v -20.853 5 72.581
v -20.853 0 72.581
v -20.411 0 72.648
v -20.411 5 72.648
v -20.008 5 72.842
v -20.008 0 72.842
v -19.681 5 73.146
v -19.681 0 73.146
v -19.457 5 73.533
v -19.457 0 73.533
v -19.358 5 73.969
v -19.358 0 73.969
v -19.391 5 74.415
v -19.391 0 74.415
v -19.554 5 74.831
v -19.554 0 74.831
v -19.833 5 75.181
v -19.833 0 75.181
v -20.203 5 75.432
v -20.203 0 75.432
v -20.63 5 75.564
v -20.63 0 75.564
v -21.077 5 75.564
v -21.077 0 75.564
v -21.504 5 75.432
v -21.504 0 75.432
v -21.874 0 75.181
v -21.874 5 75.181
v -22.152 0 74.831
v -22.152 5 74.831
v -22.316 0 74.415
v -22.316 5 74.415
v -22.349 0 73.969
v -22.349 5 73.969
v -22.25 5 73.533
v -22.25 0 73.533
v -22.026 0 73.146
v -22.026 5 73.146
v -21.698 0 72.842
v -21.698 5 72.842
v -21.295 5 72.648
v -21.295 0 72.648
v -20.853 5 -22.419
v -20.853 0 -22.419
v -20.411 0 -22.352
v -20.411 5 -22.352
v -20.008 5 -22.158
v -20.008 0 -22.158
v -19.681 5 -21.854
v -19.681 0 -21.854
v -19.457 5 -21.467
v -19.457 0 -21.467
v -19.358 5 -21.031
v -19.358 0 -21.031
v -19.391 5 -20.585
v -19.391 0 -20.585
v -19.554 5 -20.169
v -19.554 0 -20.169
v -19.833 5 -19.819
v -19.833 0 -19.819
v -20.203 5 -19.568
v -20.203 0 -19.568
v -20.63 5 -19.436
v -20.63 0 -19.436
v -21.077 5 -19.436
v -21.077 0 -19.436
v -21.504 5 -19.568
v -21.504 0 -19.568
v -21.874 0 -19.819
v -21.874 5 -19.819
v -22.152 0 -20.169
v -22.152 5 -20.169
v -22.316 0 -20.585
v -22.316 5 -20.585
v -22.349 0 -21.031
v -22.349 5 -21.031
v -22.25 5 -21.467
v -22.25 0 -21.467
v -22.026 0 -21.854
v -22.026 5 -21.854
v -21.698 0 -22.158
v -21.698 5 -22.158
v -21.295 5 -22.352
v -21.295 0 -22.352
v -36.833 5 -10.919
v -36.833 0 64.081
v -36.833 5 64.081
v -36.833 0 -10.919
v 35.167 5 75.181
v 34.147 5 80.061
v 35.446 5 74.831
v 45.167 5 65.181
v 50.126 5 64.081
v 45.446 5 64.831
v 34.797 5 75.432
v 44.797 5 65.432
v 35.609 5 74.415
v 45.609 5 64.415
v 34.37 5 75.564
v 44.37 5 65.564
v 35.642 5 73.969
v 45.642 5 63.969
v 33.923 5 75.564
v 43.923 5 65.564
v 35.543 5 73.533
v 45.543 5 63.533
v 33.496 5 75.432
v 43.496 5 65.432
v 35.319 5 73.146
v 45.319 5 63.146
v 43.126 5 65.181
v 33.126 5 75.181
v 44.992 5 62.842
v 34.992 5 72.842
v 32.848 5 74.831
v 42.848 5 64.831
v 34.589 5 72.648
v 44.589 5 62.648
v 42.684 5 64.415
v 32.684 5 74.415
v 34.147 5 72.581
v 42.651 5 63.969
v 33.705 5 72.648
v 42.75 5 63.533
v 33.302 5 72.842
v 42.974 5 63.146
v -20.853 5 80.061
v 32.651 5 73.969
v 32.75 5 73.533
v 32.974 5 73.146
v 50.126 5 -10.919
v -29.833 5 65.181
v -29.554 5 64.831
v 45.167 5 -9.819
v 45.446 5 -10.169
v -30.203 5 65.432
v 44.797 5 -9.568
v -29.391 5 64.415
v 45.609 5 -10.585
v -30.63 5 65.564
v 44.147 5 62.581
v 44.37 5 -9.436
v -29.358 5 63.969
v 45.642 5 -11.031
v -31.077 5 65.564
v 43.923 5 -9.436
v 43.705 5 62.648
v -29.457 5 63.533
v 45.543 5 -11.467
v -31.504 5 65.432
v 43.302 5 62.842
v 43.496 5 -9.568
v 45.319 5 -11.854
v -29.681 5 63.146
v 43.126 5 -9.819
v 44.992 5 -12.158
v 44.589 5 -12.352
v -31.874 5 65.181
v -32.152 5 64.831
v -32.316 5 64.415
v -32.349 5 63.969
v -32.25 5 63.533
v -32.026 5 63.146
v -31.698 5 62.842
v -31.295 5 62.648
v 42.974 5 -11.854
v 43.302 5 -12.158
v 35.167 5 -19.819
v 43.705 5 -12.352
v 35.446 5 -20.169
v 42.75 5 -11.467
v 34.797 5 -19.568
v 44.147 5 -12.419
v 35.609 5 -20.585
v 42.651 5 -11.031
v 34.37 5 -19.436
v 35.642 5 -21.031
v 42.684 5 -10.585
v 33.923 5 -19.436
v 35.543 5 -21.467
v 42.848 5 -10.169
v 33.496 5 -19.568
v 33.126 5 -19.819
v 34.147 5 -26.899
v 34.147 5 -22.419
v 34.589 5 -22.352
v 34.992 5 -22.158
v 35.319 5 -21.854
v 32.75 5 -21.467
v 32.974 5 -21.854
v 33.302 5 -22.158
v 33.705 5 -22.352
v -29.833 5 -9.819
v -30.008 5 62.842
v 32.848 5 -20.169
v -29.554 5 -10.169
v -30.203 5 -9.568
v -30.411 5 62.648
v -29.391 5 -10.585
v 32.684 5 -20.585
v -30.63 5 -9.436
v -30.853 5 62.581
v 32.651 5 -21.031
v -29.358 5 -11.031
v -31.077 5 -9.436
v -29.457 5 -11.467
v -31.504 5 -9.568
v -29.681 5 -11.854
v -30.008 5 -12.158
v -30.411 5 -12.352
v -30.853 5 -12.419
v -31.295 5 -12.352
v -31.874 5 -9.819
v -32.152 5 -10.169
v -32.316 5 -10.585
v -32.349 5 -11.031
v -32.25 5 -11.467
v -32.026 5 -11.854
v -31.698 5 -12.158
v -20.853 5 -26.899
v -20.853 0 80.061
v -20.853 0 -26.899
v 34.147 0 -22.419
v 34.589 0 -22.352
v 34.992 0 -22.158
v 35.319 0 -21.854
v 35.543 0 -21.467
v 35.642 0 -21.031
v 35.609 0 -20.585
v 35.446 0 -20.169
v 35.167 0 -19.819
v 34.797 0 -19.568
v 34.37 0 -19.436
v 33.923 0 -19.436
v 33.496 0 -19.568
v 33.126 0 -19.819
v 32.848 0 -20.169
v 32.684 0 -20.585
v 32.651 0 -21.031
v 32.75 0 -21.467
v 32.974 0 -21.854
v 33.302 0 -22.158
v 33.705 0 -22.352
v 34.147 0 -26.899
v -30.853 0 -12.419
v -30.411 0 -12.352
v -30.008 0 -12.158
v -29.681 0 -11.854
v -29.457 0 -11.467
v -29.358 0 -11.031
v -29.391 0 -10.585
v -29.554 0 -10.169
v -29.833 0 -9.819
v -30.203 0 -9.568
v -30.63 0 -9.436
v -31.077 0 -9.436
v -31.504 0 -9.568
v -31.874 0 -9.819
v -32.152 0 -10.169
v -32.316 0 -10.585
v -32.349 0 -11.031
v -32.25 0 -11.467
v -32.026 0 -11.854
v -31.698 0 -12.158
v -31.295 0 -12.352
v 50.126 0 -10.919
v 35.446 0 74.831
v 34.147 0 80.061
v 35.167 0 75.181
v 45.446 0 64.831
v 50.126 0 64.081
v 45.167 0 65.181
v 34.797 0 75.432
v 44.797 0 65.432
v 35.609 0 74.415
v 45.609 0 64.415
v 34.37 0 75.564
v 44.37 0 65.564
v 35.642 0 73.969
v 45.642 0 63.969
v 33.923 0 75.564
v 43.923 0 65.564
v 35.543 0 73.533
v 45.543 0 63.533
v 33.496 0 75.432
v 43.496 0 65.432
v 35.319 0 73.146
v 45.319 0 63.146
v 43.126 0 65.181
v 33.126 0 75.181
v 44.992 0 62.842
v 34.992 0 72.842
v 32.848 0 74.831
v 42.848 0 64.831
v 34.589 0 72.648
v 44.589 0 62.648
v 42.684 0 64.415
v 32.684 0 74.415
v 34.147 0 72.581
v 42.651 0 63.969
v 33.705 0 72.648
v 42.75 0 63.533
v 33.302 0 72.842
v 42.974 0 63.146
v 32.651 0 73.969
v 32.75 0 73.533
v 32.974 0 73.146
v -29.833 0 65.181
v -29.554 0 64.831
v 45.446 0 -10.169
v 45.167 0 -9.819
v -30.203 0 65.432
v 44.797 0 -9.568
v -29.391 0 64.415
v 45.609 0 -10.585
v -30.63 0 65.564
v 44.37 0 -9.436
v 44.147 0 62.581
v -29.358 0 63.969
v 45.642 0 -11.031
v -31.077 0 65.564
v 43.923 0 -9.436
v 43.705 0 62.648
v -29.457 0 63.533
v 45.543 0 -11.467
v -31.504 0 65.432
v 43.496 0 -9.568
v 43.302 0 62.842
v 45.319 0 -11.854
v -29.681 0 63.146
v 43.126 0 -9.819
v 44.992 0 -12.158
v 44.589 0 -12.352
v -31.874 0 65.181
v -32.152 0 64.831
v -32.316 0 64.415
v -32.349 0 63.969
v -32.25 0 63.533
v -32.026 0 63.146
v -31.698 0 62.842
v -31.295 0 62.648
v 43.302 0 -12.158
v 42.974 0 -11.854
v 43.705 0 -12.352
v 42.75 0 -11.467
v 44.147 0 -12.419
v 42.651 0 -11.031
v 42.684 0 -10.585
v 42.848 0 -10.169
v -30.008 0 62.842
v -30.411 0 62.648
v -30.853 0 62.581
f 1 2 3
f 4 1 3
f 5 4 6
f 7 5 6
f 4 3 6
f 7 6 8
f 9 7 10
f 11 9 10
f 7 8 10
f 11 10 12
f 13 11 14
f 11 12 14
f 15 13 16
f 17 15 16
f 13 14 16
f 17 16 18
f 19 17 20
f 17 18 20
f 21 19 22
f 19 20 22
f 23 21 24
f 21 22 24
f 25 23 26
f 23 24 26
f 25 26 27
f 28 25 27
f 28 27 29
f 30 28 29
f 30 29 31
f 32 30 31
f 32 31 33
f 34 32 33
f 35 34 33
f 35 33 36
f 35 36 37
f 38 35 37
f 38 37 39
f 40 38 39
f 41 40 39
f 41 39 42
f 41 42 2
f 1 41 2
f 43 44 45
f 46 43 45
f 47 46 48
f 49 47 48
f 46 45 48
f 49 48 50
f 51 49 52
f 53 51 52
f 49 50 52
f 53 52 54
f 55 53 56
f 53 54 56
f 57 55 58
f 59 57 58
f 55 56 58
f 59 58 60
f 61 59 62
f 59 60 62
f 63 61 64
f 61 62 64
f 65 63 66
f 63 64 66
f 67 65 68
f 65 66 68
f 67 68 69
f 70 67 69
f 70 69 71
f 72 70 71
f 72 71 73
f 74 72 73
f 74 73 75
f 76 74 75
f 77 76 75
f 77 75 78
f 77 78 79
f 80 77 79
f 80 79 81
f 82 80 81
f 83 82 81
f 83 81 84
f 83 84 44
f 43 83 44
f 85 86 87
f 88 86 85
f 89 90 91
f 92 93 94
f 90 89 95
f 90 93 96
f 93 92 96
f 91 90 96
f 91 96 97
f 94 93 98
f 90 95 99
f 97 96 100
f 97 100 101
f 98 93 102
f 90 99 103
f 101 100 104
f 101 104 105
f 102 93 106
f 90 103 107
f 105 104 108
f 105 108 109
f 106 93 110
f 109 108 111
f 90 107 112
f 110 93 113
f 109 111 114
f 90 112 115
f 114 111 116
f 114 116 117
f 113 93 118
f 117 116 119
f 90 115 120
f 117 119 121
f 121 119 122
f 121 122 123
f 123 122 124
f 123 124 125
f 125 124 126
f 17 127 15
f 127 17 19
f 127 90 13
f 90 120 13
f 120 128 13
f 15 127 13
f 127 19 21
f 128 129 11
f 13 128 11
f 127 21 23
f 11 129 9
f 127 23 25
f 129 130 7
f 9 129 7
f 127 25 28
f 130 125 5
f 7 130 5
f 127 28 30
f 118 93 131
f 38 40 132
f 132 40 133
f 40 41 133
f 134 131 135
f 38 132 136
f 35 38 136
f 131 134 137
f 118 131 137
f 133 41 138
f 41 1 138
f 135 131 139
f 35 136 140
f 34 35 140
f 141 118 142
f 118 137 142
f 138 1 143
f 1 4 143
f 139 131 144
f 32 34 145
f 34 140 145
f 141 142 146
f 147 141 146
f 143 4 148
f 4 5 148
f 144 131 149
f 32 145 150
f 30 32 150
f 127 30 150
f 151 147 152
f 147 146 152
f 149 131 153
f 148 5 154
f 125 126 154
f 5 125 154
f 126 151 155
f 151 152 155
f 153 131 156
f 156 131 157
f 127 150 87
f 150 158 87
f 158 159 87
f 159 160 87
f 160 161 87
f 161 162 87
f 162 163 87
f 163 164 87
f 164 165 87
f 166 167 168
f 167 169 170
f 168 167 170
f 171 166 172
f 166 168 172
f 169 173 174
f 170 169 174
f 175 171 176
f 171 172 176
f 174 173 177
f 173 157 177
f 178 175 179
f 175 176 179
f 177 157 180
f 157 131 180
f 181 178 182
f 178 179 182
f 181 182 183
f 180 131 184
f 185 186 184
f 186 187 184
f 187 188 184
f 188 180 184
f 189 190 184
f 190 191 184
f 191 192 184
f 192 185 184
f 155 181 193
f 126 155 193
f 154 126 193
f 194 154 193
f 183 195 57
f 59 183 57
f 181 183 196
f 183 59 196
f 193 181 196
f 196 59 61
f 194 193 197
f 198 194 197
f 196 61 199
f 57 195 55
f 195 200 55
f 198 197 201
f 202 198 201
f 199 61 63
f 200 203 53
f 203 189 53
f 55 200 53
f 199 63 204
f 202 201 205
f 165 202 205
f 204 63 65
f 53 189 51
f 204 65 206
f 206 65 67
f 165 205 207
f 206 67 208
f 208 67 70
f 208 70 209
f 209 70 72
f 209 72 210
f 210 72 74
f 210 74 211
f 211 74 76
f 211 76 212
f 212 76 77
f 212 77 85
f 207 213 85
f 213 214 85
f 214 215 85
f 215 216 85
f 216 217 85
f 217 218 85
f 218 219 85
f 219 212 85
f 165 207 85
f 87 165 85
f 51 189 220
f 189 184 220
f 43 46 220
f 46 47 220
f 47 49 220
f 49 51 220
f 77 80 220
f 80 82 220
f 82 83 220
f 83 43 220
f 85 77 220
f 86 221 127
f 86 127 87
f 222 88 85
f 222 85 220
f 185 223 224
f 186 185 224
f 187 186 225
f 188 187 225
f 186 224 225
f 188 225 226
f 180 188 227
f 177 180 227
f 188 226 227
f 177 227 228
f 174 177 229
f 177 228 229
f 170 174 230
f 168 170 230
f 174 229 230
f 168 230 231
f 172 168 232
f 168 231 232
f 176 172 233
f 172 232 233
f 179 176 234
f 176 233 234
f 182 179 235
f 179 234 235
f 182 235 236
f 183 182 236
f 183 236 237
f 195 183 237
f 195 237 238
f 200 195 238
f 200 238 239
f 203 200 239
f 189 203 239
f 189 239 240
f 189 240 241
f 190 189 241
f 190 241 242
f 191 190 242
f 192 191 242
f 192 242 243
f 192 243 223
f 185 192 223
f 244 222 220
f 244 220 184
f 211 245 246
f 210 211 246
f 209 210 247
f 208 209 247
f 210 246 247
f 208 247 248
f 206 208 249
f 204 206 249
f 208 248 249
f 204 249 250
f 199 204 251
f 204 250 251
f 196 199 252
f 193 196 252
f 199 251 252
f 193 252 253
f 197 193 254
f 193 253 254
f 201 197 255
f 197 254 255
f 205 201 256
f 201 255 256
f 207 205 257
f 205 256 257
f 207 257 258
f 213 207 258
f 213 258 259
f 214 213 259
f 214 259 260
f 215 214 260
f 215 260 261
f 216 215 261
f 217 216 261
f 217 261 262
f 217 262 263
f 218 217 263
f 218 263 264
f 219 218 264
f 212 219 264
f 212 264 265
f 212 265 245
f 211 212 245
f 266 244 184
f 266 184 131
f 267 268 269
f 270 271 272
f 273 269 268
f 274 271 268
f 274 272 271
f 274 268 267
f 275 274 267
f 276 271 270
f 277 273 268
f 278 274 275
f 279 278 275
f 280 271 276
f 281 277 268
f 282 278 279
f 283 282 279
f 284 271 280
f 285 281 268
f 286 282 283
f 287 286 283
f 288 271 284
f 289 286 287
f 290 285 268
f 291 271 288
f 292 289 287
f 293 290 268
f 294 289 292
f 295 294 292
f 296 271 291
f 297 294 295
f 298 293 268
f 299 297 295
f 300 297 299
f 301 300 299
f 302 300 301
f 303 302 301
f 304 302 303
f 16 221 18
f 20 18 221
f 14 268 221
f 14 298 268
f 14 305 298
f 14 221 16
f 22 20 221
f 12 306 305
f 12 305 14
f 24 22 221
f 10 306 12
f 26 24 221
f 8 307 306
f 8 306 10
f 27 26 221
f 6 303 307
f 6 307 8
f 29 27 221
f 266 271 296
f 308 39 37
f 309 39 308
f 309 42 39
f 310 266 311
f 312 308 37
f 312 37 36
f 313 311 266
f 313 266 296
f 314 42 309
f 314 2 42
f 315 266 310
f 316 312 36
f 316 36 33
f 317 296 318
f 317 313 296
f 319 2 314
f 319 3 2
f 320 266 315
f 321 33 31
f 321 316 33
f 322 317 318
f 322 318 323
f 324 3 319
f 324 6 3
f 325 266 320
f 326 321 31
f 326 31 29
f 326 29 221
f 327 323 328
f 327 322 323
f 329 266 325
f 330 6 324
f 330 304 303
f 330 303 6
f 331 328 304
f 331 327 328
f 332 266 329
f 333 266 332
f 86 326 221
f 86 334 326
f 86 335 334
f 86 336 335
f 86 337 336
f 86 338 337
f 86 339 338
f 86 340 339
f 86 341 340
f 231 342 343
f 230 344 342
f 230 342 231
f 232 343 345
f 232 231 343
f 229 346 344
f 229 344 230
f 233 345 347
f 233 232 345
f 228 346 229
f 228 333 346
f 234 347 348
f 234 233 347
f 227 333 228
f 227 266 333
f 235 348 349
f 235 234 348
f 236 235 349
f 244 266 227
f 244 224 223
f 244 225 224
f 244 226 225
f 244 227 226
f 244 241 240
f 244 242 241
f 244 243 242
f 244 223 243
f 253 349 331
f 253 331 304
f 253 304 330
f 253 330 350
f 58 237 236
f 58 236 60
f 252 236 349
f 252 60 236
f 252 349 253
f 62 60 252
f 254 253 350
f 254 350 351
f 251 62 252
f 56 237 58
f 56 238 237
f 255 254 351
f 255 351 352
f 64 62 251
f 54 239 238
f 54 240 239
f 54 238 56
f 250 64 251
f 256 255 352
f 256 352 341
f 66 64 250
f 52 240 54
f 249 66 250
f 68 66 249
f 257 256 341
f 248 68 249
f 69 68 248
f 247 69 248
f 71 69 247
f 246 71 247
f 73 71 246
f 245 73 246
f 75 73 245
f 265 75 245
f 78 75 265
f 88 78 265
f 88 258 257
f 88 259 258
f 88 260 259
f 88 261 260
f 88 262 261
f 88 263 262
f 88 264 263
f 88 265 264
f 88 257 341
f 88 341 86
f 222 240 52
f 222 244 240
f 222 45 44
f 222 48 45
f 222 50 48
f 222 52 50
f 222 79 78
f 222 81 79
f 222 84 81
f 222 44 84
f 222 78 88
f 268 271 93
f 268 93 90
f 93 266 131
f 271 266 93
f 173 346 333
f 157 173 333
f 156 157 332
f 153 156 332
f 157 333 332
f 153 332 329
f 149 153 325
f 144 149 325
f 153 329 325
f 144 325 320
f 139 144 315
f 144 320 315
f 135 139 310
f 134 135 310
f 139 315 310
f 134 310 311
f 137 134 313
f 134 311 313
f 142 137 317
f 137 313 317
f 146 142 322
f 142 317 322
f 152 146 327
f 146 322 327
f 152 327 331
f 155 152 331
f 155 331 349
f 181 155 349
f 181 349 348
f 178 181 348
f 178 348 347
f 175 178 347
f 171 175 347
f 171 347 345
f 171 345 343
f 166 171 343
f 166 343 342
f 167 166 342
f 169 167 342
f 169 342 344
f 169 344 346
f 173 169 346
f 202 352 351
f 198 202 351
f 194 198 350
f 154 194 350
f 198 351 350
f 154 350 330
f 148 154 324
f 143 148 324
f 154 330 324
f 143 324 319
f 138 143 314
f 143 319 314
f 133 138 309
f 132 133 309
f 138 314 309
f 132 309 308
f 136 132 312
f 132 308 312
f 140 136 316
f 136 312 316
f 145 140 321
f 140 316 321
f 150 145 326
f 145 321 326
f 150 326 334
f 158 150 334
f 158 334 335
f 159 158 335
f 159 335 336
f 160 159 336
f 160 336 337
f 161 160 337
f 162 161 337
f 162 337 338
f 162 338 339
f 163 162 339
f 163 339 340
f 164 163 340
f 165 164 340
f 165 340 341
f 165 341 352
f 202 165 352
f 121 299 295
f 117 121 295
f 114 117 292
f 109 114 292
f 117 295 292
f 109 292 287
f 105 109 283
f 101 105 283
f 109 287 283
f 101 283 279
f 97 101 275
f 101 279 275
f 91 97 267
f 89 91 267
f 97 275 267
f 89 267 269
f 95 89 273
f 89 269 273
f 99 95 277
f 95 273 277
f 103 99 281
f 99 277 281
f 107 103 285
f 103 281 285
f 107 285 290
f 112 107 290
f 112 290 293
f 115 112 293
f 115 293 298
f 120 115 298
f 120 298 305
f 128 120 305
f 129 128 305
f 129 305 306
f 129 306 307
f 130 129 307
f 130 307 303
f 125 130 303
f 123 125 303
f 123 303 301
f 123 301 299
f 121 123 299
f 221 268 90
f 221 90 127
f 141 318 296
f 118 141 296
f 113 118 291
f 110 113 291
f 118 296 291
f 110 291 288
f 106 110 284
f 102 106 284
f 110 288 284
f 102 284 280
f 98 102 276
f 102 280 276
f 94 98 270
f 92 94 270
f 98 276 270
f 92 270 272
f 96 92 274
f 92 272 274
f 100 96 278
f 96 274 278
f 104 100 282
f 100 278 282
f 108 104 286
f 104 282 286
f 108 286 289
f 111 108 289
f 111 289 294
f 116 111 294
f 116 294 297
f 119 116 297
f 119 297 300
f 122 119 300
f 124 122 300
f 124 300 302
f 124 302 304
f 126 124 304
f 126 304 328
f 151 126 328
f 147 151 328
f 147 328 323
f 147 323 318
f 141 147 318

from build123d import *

# Parameters (mm, degrees)
BOSS_EXTRUDE1_DEPTH          = 5
F_3_0_3_DIAMETER_HOLE2_D     = 3
F_3_0_3_DIAMETER_HOLE2_DEPTH = 5
F_3_0_3_DIAMETER_HOLE3_D     = 3
F_3_0_3_DIAMETER_HOLE3_DEPTH = 5
F_3_0_3_DIAMETER_HOLE4_D     = 3
F_3_0_3_DIAMETER_HOLE4_DEPTH = 5


with BuildPart() as part:
    # Sketch1 → Boss-Extrude1 (new body)
    with BuildSketch(Plane(origin=(0, 0, 0), x_dir=(1, 0, 0), z_dir=(0, 1, 0))):
        Polygon((-36.833168475, 10.918963515), (-20.85333758, 26.89879441), (34.14666242, 26.89879441), (50.126493315, 10.918963515), (50.126493315, -64.081036485), (34.14666242, -80.060867381), (-20.85333758, -80.060867381), (-36.833168475, -64.081036485), align=None)
    extrude(amount=BOSS_EXTRUDE1_DEPTH)

    # Ø3.0 (3) Diameter Hole2
    with Locations(Plane(origin=(-30.85333758, 5, -10.918963515), x_dir=(0, 0, 1), z_dir=(0, 1, 0))):
        with Locations((0, 0), (-10, 10)):
            Hole(F_3_0_3_DIAMETER_HOLE2_D / 2, depth=F_3_0_3_DIAMETER_HOLE2_DEPTH)

    # Ø3.0 (3) Diameter Hole3
    with Locations(Plane(origin=(34.14666242, 5, -20.918963515), x_dir=(0, 0, 1), z_dir=(0, 1, 0))):
        with Locations((0, 0), (10, 10)):
            Hole(F_3_0_3_DIAMETER_HOLE3_D / 2, depth=F_3_0_3_DIAMETER_HOLE3_DEPTH)

    # Ø3.0 (3) Diameter Hole4
    with Locations(Plane(origin=(-30.85333758, 5, 64.081036485), x_dir=(0, 0, 1), z_dir=(0, 1, 0))):
        with Locations((0, 0), (10, 10), (10, 65), (0, 75)):
            Hole(F_3_0_3_DIAMETER_HOLE4_D / 2, depth=F_3_0_3_DIAMETER_HOLE4_DEPTH)


solid = part.part
